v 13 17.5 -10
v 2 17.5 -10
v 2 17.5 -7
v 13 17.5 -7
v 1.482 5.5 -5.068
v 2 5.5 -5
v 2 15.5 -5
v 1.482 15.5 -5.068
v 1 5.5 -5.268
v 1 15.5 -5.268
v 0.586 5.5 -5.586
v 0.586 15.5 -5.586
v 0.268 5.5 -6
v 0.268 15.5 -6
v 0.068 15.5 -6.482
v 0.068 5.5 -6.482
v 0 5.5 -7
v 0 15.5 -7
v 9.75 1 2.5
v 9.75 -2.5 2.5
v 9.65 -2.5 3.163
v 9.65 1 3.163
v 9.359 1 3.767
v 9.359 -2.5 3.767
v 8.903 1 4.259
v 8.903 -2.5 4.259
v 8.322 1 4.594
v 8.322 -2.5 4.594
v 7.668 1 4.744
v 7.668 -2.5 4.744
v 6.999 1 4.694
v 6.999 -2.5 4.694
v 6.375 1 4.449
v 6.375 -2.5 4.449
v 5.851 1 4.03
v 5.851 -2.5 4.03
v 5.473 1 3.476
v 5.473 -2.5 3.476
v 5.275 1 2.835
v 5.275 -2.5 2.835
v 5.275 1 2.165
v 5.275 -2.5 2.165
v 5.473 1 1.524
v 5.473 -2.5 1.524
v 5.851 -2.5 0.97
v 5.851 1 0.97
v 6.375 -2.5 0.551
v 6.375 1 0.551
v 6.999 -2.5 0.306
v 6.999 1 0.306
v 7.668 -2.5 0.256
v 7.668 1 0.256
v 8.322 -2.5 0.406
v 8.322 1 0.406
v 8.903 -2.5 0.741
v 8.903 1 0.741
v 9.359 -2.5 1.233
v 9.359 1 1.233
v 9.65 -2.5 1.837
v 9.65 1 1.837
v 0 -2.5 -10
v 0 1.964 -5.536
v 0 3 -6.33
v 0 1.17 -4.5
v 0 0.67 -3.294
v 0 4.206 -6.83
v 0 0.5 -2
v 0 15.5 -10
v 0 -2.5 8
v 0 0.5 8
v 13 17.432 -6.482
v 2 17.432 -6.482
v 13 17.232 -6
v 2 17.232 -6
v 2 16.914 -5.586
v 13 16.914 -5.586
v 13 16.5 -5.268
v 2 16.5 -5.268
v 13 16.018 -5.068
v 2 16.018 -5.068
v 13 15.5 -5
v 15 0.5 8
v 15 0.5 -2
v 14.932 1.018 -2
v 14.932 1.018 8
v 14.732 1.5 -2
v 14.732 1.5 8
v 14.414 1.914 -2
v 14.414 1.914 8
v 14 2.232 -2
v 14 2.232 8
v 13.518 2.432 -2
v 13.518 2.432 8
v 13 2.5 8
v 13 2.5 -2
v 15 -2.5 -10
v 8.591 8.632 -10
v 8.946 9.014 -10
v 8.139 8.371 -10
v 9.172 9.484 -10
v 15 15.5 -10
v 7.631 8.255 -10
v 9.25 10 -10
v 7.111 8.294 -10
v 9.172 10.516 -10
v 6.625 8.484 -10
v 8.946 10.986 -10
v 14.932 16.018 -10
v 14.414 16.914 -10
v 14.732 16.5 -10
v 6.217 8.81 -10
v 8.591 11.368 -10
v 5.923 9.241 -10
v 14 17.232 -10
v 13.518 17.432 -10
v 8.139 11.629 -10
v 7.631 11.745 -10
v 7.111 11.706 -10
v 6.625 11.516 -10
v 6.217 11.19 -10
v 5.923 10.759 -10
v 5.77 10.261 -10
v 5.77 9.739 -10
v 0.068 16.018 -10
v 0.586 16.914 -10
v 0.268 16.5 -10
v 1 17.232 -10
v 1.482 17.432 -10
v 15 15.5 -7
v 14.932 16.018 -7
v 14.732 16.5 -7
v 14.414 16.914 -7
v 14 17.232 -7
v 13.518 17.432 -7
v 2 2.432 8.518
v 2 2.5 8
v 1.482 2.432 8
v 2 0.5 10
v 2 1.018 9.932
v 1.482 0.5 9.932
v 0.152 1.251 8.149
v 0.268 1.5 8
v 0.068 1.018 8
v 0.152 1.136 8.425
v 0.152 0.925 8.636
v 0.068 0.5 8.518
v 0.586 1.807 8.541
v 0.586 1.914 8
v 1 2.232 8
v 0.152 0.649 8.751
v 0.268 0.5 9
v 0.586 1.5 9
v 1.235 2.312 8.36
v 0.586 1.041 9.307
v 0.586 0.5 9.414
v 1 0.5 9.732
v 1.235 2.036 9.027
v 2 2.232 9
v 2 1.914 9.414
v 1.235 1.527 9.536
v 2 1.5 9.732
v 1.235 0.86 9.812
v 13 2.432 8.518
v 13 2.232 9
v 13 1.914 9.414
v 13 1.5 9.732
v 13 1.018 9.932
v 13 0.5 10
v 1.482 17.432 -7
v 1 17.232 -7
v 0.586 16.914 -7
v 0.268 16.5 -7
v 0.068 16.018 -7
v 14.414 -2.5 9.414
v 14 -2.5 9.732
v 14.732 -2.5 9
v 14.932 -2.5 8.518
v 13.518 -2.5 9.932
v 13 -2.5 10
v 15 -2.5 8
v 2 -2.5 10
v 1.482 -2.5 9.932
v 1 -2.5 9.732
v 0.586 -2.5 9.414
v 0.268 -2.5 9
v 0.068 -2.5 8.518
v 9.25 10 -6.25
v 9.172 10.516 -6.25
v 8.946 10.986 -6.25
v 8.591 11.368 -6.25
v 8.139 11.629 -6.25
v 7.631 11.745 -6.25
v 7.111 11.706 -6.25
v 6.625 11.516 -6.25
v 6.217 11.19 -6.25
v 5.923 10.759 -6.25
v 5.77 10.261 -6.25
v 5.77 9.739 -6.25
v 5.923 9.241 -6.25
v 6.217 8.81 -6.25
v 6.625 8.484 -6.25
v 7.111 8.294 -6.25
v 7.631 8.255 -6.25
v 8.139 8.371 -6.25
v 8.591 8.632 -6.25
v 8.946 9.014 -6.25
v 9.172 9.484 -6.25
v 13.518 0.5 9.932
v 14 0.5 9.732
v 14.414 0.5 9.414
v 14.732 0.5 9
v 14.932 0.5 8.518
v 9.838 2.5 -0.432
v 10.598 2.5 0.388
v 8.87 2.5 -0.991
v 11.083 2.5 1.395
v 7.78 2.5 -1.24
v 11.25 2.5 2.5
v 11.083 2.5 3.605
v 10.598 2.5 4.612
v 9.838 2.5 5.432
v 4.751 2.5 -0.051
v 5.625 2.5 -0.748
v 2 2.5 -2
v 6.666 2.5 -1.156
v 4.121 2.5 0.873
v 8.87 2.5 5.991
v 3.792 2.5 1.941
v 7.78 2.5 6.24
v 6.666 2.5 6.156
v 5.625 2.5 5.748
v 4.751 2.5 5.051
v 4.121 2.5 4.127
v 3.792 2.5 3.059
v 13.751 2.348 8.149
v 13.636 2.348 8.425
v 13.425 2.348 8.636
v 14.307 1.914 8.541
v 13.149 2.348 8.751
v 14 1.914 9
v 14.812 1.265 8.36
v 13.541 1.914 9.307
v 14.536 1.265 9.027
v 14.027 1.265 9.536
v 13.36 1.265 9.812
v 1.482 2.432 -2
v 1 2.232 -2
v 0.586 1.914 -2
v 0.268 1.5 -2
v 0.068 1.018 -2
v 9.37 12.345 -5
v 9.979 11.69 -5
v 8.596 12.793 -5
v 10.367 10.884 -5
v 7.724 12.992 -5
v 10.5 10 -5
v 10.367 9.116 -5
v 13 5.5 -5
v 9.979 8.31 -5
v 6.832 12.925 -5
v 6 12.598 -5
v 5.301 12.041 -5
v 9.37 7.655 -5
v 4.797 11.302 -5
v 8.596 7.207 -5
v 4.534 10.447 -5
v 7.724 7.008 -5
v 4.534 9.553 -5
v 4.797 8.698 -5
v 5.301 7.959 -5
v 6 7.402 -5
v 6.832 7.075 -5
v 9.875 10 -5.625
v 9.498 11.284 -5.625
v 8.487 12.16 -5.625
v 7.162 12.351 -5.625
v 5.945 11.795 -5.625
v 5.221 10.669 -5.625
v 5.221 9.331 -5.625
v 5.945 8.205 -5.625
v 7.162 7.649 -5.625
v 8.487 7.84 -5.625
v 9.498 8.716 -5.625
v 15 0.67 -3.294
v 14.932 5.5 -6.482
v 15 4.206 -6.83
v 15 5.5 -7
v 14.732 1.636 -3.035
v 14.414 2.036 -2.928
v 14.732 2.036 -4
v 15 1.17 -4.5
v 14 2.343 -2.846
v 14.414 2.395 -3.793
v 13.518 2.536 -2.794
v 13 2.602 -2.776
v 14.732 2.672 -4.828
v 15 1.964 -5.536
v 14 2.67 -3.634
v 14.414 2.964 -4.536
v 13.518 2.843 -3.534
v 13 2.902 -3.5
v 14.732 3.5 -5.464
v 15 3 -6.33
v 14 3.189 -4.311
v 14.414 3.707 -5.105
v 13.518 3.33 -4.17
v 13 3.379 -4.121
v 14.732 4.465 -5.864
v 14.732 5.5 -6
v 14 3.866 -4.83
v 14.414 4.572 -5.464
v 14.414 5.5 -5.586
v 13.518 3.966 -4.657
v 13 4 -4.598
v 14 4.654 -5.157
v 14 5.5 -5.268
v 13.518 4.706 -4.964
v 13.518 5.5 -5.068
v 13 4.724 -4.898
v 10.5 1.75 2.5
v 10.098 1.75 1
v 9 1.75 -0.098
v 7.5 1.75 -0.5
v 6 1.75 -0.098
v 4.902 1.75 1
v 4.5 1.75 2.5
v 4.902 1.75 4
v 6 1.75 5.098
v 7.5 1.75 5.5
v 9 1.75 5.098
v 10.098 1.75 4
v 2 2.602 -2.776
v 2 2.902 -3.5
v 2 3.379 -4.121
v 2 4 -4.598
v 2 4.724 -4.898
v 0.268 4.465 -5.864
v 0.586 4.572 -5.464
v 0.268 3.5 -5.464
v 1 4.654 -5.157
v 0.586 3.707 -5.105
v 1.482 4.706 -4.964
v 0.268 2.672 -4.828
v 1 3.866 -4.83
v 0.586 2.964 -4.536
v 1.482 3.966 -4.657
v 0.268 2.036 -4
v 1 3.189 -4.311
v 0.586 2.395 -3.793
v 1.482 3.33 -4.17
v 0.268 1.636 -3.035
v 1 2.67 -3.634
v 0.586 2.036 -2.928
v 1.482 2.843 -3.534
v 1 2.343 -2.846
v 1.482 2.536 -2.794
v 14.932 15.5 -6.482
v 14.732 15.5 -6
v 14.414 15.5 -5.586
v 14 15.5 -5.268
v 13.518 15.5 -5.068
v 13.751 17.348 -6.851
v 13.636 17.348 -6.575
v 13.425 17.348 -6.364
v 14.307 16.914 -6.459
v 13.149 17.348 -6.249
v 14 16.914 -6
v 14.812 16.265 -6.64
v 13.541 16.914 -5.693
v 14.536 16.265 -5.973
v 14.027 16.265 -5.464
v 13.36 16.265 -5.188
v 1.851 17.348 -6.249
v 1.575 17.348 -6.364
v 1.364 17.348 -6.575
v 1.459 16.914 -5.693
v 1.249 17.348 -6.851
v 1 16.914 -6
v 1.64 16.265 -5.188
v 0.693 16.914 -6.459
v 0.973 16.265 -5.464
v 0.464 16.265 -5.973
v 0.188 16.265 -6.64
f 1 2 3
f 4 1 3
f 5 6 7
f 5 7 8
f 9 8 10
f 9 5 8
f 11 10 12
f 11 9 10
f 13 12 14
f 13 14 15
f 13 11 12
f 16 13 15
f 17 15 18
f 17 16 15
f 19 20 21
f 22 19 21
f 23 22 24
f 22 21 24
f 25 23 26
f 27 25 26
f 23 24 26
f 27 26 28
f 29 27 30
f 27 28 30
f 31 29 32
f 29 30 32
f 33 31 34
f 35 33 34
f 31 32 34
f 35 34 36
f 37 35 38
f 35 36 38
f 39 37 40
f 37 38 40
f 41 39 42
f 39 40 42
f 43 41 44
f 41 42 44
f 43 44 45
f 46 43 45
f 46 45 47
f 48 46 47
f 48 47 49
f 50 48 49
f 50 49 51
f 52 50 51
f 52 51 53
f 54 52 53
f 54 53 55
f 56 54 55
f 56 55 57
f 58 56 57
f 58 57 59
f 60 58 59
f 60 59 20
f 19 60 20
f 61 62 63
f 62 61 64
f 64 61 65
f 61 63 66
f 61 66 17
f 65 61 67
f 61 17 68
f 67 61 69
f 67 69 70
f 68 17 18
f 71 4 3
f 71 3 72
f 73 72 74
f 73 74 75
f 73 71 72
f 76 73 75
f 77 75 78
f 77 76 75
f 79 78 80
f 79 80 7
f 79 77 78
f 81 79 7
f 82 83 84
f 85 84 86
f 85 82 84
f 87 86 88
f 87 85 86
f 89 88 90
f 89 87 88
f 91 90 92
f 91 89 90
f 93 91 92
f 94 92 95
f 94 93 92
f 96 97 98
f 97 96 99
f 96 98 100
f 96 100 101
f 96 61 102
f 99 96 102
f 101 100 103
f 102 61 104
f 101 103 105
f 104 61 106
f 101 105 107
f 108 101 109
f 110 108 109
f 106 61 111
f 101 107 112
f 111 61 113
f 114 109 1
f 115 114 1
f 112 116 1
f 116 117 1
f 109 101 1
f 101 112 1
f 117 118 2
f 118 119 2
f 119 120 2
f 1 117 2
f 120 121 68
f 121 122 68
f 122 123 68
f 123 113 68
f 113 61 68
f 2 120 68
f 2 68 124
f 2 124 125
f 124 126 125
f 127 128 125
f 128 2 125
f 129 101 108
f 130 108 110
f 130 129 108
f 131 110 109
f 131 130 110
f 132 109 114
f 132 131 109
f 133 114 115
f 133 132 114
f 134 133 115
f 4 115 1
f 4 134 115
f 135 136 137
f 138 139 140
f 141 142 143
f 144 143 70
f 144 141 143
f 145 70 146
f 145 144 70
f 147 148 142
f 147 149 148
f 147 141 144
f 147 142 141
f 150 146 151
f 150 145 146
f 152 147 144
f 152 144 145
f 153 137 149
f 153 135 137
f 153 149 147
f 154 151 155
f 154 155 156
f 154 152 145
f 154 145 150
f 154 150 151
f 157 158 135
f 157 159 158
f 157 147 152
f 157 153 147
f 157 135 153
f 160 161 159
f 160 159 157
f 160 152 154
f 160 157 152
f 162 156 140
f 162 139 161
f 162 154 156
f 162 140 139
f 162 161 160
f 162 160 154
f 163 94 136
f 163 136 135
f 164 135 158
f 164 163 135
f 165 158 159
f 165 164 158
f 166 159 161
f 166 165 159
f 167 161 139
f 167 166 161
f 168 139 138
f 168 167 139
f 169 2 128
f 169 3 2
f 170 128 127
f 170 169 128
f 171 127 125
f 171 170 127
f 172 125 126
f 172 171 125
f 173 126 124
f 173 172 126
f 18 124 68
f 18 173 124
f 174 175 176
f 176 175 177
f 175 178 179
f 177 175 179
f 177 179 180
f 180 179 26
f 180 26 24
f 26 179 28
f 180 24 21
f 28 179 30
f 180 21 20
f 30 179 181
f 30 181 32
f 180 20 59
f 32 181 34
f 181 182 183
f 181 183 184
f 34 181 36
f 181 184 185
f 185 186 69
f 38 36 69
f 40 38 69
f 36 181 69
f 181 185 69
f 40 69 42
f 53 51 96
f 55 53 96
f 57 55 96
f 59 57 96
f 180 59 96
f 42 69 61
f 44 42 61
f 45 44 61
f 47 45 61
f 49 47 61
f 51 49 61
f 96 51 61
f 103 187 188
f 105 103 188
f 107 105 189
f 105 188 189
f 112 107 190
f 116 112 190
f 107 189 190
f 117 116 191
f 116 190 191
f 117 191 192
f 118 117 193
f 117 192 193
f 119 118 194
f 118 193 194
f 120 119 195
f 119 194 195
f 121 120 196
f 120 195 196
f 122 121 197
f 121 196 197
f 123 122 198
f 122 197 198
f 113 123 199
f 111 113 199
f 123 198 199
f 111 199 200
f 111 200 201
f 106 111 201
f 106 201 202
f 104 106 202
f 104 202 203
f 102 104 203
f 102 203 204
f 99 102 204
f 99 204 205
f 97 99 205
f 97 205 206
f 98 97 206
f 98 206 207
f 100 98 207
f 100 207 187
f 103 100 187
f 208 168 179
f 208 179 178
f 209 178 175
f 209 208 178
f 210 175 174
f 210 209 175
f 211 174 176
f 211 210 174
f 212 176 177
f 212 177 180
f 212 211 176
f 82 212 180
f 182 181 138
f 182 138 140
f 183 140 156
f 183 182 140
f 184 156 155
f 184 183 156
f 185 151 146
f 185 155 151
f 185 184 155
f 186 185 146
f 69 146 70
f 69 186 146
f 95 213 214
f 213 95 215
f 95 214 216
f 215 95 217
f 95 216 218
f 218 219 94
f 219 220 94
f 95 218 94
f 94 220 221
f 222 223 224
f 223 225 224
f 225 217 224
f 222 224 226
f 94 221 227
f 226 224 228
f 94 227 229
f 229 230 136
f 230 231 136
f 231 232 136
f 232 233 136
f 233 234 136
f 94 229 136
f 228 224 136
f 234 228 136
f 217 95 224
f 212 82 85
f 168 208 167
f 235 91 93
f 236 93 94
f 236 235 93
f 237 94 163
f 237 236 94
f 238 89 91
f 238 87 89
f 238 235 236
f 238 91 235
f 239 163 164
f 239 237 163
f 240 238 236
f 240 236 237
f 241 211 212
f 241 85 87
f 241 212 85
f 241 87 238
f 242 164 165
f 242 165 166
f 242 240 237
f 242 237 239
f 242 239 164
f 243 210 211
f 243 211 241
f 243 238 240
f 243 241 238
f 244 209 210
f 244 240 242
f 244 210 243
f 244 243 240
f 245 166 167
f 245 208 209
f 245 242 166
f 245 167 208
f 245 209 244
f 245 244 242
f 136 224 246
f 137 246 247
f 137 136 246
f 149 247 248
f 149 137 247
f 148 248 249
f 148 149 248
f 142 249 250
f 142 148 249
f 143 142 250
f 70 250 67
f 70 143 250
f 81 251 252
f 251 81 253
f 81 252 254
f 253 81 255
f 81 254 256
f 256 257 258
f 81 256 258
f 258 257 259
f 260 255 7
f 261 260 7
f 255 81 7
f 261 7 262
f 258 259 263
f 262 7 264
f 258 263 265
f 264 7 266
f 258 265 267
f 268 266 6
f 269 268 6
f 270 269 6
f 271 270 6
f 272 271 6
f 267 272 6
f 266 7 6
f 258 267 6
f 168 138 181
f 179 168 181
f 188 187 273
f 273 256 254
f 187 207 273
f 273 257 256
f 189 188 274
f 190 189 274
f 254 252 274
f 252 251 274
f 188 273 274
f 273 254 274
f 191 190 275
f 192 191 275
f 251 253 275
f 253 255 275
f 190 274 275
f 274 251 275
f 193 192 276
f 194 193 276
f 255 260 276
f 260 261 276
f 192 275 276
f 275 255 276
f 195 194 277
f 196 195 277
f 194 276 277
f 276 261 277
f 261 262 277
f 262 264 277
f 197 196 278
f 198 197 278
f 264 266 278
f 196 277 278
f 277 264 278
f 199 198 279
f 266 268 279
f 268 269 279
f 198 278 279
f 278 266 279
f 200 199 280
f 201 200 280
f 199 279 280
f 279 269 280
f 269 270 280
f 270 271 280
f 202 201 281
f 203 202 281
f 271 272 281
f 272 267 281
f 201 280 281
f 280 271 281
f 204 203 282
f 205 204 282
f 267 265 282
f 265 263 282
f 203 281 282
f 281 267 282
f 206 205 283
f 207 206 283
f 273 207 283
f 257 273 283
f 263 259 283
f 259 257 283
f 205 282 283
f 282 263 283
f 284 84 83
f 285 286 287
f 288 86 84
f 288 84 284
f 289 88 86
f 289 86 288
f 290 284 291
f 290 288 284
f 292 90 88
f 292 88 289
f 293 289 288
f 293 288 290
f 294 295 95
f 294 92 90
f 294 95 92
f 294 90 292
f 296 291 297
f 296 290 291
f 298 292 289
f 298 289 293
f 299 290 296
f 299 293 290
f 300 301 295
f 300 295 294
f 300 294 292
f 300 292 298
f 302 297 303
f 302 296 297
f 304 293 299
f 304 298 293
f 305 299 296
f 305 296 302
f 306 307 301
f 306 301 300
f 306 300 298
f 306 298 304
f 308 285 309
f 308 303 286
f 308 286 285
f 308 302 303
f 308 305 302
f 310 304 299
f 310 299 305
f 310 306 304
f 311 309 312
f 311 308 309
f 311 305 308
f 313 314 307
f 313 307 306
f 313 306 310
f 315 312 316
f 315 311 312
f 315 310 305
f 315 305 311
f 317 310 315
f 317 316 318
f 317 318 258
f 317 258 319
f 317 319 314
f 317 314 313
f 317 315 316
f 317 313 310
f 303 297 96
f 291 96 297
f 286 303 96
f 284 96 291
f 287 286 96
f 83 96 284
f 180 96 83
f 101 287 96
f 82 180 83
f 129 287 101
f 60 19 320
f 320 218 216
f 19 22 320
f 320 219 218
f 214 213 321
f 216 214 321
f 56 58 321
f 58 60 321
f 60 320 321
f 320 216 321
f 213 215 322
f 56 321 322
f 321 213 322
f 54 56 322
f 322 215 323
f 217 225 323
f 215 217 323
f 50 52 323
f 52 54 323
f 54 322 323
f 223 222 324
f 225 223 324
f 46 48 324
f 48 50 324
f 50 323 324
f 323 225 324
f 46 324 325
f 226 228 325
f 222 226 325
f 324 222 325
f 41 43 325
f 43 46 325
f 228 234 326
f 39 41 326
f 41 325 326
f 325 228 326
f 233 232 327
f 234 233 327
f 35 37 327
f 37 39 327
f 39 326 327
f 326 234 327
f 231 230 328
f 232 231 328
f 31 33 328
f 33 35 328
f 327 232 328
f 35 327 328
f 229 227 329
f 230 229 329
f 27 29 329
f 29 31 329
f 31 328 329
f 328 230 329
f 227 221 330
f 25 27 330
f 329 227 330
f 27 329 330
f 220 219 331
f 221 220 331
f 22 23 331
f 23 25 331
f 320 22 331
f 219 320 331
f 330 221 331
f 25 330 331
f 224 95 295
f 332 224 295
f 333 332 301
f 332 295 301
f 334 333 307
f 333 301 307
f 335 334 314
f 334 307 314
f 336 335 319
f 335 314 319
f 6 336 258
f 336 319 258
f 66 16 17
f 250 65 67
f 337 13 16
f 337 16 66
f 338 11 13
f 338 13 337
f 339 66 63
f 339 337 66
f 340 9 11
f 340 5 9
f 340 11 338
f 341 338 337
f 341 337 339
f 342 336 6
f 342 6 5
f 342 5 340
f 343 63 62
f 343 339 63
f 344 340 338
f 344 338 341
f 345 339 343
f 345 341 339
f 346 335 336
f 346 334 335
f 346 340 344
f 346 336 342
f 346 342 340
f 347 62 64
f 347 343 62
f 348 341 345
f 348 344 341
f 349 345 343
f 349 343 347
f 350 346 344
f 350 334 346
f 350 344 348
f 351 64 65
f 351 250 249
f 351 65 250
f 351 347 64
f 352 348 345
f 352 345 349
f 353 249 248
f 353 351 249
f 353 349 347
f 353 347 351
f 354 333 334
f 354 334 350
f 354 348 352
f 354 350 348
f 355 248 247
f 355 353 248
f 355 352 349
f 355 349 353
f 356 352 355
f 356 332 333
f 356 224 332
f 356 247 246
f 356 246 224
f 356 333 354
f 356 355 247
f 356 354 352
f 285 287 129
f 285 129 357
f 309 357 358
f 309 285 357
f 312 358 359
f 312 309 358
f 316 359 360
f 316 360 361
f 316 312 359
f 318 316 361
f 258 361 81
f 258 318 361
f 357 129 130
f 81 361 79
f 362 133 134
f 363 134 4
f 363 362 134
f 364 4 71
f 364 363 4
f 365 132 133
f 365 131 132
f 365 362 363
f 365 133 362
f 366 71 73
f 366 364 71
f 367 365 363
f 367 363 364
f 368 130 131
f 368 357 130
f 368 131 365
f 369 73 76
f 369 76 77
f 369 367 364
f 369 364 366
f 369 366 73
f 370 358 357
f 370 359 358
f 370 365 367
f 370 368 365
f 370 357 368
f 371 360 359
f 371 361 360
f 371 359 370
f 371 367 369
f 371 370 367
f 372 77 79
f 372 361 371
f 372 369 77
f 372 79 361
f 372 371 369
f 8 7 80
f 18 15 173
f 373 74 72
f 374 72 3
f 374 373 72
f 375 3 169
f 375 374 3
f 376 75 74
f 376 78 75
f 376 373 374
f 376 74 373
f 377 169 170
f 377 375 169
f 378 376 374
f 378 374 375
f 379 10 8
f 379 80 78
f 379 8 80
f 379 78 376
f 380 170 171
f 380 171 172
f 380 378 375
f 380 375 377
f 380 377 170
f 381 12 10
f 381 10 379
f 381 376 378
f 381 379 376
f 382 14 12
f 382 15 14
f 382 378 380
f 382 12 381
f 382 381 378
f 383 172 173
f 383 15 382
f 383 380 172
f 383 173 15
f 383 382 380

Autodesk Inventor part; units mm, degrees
ref_plane "YZ Plane" through (0, 0, 0) normal (1, 0, 0) x (0, 1, 0)
ref_plane "XZ Plane" through (0, 0, 0) normal (0, 1, 0) x (-1, 0, 0)
ref_plane "XY Plane" through (0, 0, 0) normal (0, 0, 1) x (1, 0, 0)
sketch "Sketch1" plane through (0, 0, 0) normal (1, 0, 0) x (0, 1, 0)
  line L0 (0, 0) -> (0, 23.2432)
  line L1 (0, 23.2432) -> (0, 0)
  line L2 (0, 0) -> (17.5676, 0)
  line L3 (0, 0) -> (0, -18.1081)
  line L4 (0, 0) -> (-14.0541, 0)
  line L5 (-2.5, 10) -> (-2.5, -10)
  line L6 (-2.5, -10) -> (17.5, -10)
  line L7 (17.5, -10) -> (17.5, -5)
  line L8 (17.5, -5) -> (2.5, -5)
  line L9 (2.5, -5) -> (2.5, 10)
  line L10 (2.5, 10) -> (-2.5, 10)
  dimension "d0" = 20
  dimension "d1" = 5
  dimension "d2" = 5
  dimension "d3" = 20
extrude "Extrusion1" add sketch "Sketch1" along normal blind 15
sketch "Sketch2" plane through (0, -2.5, -10) normal (0, -1, 0) x (1, 0, 0)
  line L0 (0, 20) -> (0, 0) projected
  line L1 (0, 0) -> (15, 0) projected
  line L2 (15, 20) -> (15, 0) projected
  line L3 (0, 20) -> (15, 20) projected
  circle A0 centre (7.5, 12.5) radius 2.25
  point P0 (0, 10)
  dimension "d6" = 4.5
  dimension "d7" = 12.5
extrude "Extrusion2" cut sketch "Sketch2" against normal through all contours A0
sketch "Sketch3" plane through (0, 2.5, -5) normal (0, 0, 1) x (1, 0, 0)
  line L0 (0, 15) -> (0, 0) projected
  line L1 (0, 0) -> (15, 0) projected
  line L2 (15, 15) -> (15, 0) projected
  line L3 (0, 15) -> (15, 15) projected
  circle A0 centre (7.5, 7.5) radius 1.75
  point P0 (0, -2.5)
  dimension "d10" = 3.5
extrude "Extrusion3" cut sketch "Sketch3" against normal through all contours A0
chamfer "Chamfer1" distance 1.25 angle 45 1 edges at (5.75, 10, -5)
chamfer "Chamfer2" distance 1.5 angle 45 1 edges at (5.25, 2.5, 2.5)
fillet "Fillet1" radius 3 1 edges at (7.5, 2.5, -5)
fillet "Fillet2" radius 2 10 edges at (15, 0, 10) (15, 11.5, -5) (15, 2.5, 4) (15, 17.5, -7.5) (7.5, 2.5, 10) (0, 11.5, -5) (0, 2.5, 4) (7.5, 17.5, -5) (0, 0, 10) (0, 17.5, -7.5)
properties part number "escuadra"
